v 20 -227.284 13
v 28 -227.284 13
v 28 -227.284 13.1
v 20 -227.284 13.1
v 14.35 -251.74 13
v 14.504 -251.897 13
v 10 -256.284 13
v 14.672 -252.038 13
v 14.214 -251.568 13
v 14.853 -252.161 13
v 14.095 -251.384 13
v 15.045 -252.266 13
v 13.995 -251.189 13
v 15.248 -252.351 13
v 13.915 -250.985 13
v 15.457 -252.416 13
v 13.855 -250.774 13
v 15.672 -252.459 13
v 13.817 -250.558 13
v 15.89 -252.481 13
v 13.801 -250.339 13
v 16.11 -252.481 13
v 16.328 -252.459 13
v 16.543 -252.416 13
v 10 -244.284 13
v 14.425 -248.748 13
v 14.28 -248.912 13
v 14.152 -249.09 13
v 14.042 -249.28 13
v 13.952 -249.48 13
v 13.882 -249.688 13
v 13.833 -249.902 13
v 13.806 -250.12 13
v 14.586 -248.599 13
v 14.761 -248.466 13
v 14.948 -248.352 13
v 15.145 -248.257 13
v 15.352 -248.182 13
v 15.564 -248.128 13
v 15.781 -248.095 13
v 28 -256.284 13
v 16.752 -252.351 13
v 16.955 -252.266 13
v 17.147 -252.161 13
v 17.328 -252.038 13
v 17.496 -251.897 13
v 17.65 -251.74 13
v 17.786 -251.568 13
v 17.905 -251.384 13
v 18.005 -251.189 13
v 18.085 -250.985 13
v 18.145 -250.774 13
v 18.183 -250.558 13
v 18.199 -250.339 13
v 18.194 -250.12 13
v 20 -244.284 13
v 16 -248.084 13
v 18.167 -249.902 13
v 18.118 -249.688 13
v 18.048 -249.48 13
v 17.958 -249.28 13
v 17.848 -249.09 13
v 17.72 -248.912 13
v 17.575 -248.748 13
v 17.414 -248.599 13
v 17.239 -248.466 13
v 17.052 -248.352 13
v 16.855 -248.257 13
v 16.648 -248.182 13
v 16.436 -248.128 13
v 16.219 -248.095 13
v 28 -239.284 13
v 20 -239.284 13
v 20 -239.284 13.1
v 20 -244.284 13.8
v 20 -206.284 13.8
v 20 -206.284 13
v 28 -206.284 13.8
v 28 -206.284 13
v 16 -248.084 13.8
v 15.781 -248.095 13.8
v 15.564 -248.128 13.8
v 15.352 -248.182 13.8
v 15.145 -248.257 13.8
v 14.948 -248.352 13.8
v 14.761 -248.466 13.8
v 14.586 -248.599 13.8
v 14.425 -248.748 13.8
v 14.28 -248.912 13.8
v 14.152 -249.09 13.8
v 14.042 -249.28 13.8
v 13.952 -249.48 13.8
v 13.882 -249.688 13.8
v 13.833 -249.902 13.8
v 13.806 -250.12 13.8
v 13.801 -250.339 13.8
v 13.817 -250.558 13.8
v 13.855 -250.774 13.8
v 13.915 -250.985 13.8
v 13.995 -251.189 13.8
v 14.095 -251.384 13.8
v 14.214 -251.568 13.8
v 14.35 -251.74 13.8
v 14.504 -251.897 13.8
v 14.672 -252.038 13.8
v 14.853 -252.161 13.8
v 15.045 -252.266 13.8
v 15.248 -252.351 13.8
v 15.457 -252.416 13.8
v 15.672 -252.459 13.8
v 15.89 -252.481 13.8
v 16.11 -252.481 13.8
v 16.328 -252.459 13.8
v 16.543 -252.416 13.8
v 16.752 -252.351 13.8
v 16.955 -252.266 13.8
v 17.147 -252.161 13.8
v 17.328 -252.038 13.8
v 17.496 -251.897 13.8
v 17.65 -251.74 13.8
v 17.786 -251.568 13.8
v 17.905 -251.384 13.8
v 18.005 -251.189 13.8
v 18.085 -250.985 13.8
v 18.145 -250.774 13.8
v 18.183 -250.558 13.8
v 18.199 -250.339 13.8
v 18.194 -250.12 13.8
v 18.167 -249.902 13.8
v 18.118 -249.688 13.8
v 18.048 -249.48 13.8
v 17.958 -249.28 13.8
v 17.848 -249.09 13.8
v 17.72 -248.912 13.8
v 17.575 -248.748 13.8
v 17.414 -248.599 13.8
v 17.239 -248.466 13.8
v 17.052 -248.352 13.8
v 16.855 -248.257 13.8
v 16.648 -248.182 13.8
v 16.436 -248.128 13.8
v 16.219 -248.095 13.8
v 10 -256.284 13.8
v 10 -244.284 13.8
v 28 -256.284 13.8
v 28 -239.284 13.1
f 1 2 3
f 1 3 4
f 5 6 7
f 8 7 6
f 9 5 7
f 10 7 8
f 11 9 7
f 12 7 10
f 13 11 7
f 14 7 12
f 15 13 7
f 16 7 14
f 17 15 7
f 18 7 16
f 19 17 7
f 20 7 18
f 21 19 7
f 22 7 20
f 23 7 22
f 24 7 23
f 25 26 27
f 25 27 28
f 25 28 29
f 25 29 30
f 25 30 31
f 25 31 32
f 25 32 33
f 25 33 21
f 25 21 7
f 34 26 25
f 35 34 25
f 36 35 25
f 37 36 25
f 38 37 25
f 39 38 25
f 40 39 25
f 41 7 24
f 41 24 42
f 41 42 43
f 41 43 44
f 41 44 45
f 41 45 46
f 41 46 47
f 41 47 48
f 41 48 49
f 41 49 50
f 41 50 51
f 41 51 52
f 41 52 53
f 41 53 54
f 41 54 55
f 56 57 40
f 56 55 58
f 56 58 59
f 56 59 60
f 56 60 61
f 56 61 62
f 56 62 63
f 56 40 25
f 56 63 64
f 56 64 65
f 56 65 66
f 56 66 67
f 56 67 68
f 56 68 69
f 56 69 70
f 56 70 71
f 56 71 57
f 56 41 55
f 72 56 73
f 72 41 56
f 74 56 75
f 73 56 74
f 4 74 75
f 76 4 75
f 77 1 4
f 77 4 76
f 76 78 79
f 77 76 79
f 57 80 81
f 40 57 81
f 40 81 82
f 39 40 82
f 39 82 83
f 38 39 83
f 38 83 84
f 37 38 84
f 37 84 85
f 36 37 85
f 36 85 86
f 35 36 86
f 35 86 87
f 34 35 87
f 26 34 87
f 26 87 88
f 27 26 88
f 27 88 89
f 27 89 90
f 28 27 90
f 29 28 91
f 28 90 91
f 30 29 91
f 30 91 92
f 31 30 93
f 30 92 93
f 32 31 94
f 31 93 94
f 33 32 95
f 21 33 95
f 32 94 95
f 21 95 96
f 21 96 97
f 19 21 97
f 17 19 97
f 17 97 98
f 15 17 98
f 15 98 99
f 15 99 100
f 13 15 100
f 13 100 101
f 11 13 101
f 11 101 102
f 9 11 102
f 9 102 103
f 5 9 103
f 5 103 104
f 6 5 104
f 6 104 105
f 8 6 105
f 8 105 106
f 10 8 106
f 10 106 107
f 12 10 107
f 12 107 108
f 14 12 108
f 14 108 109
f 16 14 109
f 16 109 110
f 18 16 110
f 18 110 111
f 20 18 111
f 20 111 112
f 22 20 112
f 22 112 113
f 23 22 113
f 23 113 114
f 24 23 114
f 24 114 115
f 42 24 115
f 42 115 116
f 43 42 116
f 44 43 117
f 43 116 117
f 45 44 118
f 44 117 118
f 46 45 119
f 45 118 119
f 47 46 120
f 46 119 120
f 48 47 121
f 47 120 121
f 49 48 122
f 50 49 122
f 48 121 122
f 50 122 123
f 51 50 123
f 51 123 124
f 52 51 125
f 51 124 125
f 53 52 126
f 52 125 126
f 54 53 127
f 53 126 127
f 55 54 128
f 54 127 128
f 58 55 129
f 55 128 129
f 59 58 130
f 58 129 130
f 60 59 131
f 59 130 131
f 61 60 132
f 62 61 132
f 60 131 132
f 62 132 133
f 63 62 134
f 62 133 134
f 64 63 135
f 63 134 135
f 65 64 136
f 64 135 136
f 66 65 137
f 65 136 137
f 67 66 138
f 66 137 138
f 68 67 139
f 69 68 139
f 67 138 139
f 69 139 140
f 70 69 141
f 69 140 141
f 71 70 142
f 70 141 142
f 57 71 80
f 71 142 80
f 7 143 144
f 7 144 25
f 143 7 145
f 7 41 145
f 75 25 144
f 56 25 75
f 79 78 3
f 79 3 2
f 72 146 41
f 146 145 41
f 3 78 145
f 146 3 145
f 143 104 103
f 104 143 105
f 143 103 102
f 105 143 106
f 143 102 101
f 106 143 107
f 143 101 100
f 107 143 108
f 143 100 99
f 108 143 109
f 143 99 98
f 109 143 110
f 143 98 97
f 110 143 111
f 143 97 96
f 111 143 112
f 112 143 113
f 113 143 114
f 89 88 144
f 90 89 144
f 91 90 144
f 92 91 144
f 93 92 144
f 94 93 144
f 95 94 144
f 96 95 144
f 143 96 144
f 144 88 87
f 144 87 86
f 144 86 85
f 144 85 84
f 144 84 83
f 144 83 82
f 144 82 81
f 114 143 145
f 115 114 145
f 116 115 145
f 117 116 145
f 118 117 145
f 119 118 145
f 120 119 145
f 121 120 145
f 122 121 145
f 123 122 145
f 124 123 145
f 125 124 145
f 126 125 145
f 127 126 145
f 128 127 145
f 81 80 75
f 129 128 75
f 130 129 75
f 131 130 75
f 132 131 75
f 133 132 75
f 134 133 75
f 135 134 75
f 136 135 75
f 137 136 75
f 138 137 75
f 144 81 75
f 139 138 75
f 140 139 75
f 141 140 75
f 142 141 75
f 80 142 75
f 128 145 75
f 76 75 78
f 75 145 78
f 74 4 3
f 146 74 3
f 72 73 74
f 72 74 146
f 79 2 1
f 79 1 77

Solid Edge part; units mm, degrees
sketch "Sketch1" plane through (28, 0, 0) normal (1, 0, 0) x (0, 1, 0)
  line L0 (-256.284, 13.8) -> (-206.284, 13.8)
  line L1 (-206.284, 13.8) -> (-206.284, 13)
  line L2 (-256.284, 13) -> (-206.284, 13)
  line L3 (-256.284, 13) -> (-256.284, 13.8)
extrude "Protrusion1" add sketch "Sketch1" against normal blind 18
sketch "Sketch2" plane through (19, -249.0202, 13.8) normal (0, 0, 1) x (0, 1, 0)
  line L0 (4.7362, 9) -> (4.7362, -1)
  line L1 (4.7362, -1) -> (44.7362, -1)
  line L2 (44.7362, -1) -> (44.7362, 9)
  line L3 (44.7362, 9) -> (4.7362, 9)
  circle A0 centre (-1.2638, 3) radius 2.2
  dimension "D1" = 10
  dimension "D2" = 6
  dimension "D3" = 6
  dimension "D4" = 12
  dimension "D5" = 40
extrude "Cutout1" cut sketch "Sketch2" along normal through all and the other way through all
sketch "Sketch3" plane through (19, -231.284, 13) normal (0, 0, -1) x (1, 0, 0)
  line L0 (1, 8) -> (9, 8)
  line L1 (9, -4) -> (9, 8)
  line L2 (9, -4) -> (1, -4)
  line L3 (1, 8) -> (1, -4)
  dimension "D1" = 8
extrude "ExtrudedCutout_4" cut sketch "Sketch3" against normal blind 0.1
